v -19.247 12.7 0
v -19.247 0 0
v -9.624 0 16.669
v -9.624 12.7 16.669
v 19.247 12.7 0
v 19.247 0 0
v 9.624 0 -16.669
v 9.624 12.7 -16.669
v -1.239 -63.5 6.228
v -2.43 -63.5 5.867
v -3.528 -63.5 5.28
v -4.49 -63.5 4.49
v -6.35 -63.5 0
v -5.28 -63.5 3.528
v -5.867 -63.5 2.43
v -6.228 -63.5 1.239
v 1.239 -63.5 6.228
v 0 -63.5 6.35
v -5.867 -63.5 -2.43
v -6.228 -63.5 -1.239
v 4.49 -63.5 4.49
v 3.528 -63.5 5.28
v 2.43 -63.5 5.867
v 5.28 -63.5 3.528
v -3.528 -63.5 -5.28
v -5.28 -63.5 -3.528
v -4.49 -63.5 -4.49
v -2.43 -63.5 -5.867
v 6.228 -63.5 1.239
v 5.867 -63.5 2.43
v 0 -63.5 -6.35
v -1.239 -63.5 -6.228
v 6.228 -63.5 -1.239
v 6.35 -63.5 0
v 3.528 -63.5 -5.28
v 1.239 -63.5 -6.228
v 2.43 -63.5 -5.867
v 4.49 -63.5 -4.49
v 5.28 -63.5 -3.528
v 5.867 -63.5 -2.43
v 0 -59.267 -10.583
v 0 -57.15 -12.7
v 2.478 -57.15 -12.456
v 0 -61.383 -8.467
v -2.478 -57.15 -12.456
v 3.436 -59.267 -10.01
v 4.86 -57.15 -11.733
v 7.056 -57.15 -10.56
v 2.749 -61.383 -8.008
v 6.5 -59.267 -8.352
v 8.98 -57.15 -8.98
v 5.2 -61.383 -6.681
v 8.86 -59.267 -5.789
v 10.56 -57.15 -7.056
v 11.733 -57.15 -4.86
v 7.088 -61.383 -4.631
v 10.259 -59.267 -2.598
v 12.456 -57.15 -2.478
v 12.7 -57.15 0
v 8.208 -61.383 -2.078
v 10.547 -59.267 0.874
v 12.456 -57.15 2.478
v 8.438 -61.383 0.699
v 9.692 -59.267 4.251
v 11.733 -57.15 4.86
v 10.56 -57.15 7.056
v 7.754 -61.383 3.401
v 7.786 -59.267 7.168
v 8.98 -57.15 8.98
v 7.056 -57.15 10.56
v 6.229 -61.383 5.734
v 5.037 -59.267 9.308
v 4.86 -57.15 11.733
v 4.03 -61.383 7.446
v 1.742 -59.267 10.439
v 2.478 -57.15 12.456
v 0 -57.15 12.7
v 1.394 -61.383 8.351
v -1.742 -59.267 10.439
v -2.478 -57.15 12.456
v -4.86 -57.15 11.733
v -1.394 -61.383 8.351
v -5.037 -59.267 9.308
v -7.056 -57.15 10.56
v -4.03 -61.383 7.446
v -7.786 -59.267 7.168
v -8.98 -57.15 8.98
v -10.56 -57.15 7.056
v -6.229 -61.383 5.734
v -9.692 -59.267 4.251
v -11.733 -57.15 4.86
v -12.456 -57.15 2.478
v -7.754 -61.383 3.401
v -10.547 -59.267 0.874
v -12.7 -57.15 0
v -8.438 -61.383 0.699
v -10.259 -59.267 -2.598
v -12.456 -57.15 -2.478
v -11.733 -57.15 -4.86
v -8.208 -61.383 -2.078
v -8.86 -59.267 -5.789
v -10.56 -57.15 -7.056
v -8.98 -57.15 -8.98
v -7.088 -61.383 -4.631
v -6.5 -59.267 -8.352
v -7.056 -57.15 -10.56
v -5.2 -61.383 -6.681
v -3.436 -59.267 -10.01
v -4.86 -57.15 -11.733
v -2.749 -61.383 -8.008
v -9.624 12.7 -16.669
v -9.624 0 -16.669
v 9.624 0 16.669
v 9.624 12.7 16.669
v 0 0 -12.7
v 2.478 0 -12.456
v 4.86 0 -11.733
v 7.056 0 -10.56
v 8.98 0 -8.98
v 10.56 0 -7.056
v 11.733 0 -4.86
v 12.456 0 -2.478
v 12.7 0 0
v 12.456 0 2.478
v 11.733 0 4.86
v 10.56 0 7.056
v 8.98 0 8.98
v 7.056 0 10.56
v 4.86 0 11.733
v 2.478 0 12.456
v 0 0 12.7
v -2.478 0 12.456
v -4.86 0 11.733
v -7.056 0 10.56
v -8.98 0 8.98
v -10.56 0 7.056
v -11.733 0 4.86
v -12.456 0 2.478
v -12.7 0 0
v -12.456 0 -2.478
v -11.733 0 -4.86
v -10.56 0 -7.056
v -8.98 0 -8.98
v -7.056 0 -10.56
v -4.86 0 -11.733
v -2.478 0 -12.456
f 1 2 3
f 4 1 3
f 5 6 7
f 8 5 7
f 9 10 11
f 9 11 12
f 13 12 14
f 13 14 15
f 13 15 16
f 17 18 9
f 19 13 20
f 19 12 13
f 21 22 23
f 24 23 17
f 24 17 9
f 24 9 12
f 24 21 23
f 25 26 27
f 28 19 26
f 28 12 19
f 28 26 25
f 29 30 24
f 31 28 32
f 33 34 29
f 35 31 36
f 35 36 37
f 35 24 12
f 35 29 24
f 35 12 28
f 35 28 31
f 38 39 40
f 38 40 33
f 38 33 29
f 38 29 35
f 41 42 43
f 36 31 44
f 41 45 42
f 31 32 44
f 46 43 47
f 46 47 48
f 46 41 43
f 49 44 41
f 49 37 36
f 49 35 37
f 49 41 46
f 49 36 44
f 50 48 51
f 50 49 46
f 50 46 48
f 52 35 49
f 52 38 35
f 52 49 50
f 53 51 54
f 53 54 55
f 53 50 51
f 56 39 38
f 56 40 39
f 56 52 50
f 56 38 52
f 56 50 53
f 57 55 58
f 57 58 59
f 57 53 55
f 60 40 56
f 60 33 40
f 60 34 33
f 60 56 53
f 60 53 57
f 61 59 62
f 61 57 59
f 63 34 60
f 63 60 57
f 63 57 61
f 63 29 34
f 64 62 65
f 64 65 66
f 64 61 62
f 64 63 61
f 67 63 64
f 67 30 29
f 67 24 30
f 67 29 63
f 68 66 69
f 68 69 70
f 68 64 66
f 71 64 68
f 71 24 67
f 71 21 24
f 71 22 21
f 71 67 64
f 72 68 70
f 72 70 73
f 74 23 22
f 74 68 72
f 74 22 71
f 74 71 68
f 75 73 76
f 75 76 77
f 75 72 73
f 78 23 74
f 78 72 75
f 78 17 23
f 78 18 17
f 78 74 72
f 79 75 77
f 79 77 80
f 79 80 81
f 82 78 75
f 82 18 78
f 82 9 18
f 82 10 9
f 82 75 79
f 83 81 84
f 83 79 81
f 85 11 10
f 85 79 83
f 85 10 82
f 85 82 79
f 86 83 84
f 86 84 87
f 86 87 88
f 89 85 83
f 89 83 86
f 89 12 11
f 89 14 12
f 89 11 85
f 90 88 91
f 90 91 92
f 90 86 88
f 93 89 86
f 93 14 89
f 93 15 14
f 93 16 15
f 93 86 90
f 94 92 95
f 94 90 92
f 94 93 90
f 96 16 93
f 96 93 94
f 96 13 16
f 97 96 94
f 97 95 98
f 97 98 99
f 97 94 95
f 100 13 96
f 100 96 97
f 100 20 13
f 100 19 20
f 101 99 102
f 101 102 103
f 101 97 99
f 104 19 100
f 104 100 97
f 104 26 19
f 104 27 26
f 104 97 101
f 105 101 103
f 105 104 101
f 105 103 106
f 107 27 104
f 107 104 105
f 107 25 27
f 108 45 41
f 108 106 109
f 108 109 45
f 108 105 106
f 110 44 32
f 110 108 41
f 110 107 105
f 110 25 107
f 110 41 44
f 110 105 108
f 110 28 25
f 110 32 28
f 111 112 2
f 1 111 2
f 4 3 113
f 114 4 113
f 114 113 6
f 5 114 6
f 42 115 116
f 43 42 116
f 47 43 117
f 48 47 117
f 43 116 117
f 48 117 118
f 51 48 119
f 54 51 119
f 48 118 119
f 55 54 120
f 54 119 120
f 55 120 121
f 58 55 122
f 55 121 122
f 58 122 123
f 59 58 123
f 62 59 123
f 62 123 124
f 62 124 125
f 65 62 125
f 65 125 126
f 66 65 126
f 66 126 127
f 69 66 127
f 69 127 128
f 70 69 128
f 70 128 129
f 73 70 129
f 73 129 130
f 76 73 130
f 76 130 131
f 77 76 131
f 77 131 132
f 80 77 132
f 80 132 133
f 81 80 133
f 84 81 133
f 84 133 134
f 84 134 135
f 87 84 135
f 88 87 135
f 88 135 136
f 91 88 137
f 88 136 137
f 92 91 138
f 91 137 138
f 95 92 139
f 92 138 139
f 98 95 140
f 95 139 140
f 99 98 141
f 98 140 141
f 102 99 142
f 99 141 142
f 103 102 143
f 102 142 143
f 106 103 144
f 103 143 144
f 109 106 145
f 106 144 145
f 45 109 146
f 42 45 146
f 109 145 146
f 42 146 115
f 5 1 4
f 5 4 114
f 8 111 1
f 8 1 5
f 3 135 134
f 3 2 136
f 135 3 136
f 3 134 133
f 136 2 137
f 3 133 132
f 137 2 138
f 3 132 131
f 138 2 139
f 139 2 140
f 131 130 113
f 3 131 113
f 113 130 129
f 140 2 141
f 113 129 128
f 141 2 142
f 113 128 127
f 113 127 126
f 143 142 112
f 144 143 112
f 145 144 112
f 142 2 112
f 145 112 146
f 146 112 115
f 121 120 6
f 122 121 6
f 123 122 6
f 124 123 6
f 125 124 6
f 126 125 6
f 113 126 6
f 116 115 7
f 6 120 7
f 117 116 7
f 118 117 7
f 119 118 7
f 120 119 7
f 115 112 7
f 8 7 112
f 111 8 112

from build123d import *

# Parameters (mm, degrees)
BOSS_EXTRUDE2_DEPTH = 12.7
SKETCH6_R           = 12.7
BOSS_EXTRUDE3_DEPTH = 57.15
SKETCH10_R          = 12.7
BOSS_EXTRUDE5_DEPTH = 6.35
CHAMFER2_SIZE       = 6.35


with BuildPart() as part:
    # Sketch5 → Boss-Extrude2 (new body)
    with BuildSketch(Plane(origin=(0, 0, 0), x_dir=(1, 0, 0), z_dir=(0, 1, 0))):
        Polygon((19.247414599, 0), (9.6237073, 16.66875), (-9.6237073, 16.66875), (-19.247414599, 0), (-9.6237073, -16.66875), (9.6237073, -16.66875), align=None)
    extrude(amount=BOSS_EXTRUDE2_DEPTH)

    # Sketch6 → Boss-Extrude3 (add)
    with BuildSketch(Plane.XZ):
        with Locations(Location((0, 0, 0), (0, 0, 270))):
            Circle(SKETCH6_R)
    extrude(amount=BOSS_EXTRUDE3_DEPTH)

    # Sketch10 → Boss-Extrude5 (add)
    with BuildSketch(Plane.XZ.offset(57.15)):
        with Locations(Location((0, 0, 0), (0, 0, 270))):
            Circle(SKETCH10_R)
    extrude(amount=BOSS_EXTRUDE5_DEPTH)

    # Chamfer2
    chamfer2_edges = [part.edges().sort_by_distance(p)[0] for p in [
        (0, -63.5, 12.7),
    ]]
    chamfer(chamfer2_edges, length=CHAMFER2_SIZE)


solid = part.part
